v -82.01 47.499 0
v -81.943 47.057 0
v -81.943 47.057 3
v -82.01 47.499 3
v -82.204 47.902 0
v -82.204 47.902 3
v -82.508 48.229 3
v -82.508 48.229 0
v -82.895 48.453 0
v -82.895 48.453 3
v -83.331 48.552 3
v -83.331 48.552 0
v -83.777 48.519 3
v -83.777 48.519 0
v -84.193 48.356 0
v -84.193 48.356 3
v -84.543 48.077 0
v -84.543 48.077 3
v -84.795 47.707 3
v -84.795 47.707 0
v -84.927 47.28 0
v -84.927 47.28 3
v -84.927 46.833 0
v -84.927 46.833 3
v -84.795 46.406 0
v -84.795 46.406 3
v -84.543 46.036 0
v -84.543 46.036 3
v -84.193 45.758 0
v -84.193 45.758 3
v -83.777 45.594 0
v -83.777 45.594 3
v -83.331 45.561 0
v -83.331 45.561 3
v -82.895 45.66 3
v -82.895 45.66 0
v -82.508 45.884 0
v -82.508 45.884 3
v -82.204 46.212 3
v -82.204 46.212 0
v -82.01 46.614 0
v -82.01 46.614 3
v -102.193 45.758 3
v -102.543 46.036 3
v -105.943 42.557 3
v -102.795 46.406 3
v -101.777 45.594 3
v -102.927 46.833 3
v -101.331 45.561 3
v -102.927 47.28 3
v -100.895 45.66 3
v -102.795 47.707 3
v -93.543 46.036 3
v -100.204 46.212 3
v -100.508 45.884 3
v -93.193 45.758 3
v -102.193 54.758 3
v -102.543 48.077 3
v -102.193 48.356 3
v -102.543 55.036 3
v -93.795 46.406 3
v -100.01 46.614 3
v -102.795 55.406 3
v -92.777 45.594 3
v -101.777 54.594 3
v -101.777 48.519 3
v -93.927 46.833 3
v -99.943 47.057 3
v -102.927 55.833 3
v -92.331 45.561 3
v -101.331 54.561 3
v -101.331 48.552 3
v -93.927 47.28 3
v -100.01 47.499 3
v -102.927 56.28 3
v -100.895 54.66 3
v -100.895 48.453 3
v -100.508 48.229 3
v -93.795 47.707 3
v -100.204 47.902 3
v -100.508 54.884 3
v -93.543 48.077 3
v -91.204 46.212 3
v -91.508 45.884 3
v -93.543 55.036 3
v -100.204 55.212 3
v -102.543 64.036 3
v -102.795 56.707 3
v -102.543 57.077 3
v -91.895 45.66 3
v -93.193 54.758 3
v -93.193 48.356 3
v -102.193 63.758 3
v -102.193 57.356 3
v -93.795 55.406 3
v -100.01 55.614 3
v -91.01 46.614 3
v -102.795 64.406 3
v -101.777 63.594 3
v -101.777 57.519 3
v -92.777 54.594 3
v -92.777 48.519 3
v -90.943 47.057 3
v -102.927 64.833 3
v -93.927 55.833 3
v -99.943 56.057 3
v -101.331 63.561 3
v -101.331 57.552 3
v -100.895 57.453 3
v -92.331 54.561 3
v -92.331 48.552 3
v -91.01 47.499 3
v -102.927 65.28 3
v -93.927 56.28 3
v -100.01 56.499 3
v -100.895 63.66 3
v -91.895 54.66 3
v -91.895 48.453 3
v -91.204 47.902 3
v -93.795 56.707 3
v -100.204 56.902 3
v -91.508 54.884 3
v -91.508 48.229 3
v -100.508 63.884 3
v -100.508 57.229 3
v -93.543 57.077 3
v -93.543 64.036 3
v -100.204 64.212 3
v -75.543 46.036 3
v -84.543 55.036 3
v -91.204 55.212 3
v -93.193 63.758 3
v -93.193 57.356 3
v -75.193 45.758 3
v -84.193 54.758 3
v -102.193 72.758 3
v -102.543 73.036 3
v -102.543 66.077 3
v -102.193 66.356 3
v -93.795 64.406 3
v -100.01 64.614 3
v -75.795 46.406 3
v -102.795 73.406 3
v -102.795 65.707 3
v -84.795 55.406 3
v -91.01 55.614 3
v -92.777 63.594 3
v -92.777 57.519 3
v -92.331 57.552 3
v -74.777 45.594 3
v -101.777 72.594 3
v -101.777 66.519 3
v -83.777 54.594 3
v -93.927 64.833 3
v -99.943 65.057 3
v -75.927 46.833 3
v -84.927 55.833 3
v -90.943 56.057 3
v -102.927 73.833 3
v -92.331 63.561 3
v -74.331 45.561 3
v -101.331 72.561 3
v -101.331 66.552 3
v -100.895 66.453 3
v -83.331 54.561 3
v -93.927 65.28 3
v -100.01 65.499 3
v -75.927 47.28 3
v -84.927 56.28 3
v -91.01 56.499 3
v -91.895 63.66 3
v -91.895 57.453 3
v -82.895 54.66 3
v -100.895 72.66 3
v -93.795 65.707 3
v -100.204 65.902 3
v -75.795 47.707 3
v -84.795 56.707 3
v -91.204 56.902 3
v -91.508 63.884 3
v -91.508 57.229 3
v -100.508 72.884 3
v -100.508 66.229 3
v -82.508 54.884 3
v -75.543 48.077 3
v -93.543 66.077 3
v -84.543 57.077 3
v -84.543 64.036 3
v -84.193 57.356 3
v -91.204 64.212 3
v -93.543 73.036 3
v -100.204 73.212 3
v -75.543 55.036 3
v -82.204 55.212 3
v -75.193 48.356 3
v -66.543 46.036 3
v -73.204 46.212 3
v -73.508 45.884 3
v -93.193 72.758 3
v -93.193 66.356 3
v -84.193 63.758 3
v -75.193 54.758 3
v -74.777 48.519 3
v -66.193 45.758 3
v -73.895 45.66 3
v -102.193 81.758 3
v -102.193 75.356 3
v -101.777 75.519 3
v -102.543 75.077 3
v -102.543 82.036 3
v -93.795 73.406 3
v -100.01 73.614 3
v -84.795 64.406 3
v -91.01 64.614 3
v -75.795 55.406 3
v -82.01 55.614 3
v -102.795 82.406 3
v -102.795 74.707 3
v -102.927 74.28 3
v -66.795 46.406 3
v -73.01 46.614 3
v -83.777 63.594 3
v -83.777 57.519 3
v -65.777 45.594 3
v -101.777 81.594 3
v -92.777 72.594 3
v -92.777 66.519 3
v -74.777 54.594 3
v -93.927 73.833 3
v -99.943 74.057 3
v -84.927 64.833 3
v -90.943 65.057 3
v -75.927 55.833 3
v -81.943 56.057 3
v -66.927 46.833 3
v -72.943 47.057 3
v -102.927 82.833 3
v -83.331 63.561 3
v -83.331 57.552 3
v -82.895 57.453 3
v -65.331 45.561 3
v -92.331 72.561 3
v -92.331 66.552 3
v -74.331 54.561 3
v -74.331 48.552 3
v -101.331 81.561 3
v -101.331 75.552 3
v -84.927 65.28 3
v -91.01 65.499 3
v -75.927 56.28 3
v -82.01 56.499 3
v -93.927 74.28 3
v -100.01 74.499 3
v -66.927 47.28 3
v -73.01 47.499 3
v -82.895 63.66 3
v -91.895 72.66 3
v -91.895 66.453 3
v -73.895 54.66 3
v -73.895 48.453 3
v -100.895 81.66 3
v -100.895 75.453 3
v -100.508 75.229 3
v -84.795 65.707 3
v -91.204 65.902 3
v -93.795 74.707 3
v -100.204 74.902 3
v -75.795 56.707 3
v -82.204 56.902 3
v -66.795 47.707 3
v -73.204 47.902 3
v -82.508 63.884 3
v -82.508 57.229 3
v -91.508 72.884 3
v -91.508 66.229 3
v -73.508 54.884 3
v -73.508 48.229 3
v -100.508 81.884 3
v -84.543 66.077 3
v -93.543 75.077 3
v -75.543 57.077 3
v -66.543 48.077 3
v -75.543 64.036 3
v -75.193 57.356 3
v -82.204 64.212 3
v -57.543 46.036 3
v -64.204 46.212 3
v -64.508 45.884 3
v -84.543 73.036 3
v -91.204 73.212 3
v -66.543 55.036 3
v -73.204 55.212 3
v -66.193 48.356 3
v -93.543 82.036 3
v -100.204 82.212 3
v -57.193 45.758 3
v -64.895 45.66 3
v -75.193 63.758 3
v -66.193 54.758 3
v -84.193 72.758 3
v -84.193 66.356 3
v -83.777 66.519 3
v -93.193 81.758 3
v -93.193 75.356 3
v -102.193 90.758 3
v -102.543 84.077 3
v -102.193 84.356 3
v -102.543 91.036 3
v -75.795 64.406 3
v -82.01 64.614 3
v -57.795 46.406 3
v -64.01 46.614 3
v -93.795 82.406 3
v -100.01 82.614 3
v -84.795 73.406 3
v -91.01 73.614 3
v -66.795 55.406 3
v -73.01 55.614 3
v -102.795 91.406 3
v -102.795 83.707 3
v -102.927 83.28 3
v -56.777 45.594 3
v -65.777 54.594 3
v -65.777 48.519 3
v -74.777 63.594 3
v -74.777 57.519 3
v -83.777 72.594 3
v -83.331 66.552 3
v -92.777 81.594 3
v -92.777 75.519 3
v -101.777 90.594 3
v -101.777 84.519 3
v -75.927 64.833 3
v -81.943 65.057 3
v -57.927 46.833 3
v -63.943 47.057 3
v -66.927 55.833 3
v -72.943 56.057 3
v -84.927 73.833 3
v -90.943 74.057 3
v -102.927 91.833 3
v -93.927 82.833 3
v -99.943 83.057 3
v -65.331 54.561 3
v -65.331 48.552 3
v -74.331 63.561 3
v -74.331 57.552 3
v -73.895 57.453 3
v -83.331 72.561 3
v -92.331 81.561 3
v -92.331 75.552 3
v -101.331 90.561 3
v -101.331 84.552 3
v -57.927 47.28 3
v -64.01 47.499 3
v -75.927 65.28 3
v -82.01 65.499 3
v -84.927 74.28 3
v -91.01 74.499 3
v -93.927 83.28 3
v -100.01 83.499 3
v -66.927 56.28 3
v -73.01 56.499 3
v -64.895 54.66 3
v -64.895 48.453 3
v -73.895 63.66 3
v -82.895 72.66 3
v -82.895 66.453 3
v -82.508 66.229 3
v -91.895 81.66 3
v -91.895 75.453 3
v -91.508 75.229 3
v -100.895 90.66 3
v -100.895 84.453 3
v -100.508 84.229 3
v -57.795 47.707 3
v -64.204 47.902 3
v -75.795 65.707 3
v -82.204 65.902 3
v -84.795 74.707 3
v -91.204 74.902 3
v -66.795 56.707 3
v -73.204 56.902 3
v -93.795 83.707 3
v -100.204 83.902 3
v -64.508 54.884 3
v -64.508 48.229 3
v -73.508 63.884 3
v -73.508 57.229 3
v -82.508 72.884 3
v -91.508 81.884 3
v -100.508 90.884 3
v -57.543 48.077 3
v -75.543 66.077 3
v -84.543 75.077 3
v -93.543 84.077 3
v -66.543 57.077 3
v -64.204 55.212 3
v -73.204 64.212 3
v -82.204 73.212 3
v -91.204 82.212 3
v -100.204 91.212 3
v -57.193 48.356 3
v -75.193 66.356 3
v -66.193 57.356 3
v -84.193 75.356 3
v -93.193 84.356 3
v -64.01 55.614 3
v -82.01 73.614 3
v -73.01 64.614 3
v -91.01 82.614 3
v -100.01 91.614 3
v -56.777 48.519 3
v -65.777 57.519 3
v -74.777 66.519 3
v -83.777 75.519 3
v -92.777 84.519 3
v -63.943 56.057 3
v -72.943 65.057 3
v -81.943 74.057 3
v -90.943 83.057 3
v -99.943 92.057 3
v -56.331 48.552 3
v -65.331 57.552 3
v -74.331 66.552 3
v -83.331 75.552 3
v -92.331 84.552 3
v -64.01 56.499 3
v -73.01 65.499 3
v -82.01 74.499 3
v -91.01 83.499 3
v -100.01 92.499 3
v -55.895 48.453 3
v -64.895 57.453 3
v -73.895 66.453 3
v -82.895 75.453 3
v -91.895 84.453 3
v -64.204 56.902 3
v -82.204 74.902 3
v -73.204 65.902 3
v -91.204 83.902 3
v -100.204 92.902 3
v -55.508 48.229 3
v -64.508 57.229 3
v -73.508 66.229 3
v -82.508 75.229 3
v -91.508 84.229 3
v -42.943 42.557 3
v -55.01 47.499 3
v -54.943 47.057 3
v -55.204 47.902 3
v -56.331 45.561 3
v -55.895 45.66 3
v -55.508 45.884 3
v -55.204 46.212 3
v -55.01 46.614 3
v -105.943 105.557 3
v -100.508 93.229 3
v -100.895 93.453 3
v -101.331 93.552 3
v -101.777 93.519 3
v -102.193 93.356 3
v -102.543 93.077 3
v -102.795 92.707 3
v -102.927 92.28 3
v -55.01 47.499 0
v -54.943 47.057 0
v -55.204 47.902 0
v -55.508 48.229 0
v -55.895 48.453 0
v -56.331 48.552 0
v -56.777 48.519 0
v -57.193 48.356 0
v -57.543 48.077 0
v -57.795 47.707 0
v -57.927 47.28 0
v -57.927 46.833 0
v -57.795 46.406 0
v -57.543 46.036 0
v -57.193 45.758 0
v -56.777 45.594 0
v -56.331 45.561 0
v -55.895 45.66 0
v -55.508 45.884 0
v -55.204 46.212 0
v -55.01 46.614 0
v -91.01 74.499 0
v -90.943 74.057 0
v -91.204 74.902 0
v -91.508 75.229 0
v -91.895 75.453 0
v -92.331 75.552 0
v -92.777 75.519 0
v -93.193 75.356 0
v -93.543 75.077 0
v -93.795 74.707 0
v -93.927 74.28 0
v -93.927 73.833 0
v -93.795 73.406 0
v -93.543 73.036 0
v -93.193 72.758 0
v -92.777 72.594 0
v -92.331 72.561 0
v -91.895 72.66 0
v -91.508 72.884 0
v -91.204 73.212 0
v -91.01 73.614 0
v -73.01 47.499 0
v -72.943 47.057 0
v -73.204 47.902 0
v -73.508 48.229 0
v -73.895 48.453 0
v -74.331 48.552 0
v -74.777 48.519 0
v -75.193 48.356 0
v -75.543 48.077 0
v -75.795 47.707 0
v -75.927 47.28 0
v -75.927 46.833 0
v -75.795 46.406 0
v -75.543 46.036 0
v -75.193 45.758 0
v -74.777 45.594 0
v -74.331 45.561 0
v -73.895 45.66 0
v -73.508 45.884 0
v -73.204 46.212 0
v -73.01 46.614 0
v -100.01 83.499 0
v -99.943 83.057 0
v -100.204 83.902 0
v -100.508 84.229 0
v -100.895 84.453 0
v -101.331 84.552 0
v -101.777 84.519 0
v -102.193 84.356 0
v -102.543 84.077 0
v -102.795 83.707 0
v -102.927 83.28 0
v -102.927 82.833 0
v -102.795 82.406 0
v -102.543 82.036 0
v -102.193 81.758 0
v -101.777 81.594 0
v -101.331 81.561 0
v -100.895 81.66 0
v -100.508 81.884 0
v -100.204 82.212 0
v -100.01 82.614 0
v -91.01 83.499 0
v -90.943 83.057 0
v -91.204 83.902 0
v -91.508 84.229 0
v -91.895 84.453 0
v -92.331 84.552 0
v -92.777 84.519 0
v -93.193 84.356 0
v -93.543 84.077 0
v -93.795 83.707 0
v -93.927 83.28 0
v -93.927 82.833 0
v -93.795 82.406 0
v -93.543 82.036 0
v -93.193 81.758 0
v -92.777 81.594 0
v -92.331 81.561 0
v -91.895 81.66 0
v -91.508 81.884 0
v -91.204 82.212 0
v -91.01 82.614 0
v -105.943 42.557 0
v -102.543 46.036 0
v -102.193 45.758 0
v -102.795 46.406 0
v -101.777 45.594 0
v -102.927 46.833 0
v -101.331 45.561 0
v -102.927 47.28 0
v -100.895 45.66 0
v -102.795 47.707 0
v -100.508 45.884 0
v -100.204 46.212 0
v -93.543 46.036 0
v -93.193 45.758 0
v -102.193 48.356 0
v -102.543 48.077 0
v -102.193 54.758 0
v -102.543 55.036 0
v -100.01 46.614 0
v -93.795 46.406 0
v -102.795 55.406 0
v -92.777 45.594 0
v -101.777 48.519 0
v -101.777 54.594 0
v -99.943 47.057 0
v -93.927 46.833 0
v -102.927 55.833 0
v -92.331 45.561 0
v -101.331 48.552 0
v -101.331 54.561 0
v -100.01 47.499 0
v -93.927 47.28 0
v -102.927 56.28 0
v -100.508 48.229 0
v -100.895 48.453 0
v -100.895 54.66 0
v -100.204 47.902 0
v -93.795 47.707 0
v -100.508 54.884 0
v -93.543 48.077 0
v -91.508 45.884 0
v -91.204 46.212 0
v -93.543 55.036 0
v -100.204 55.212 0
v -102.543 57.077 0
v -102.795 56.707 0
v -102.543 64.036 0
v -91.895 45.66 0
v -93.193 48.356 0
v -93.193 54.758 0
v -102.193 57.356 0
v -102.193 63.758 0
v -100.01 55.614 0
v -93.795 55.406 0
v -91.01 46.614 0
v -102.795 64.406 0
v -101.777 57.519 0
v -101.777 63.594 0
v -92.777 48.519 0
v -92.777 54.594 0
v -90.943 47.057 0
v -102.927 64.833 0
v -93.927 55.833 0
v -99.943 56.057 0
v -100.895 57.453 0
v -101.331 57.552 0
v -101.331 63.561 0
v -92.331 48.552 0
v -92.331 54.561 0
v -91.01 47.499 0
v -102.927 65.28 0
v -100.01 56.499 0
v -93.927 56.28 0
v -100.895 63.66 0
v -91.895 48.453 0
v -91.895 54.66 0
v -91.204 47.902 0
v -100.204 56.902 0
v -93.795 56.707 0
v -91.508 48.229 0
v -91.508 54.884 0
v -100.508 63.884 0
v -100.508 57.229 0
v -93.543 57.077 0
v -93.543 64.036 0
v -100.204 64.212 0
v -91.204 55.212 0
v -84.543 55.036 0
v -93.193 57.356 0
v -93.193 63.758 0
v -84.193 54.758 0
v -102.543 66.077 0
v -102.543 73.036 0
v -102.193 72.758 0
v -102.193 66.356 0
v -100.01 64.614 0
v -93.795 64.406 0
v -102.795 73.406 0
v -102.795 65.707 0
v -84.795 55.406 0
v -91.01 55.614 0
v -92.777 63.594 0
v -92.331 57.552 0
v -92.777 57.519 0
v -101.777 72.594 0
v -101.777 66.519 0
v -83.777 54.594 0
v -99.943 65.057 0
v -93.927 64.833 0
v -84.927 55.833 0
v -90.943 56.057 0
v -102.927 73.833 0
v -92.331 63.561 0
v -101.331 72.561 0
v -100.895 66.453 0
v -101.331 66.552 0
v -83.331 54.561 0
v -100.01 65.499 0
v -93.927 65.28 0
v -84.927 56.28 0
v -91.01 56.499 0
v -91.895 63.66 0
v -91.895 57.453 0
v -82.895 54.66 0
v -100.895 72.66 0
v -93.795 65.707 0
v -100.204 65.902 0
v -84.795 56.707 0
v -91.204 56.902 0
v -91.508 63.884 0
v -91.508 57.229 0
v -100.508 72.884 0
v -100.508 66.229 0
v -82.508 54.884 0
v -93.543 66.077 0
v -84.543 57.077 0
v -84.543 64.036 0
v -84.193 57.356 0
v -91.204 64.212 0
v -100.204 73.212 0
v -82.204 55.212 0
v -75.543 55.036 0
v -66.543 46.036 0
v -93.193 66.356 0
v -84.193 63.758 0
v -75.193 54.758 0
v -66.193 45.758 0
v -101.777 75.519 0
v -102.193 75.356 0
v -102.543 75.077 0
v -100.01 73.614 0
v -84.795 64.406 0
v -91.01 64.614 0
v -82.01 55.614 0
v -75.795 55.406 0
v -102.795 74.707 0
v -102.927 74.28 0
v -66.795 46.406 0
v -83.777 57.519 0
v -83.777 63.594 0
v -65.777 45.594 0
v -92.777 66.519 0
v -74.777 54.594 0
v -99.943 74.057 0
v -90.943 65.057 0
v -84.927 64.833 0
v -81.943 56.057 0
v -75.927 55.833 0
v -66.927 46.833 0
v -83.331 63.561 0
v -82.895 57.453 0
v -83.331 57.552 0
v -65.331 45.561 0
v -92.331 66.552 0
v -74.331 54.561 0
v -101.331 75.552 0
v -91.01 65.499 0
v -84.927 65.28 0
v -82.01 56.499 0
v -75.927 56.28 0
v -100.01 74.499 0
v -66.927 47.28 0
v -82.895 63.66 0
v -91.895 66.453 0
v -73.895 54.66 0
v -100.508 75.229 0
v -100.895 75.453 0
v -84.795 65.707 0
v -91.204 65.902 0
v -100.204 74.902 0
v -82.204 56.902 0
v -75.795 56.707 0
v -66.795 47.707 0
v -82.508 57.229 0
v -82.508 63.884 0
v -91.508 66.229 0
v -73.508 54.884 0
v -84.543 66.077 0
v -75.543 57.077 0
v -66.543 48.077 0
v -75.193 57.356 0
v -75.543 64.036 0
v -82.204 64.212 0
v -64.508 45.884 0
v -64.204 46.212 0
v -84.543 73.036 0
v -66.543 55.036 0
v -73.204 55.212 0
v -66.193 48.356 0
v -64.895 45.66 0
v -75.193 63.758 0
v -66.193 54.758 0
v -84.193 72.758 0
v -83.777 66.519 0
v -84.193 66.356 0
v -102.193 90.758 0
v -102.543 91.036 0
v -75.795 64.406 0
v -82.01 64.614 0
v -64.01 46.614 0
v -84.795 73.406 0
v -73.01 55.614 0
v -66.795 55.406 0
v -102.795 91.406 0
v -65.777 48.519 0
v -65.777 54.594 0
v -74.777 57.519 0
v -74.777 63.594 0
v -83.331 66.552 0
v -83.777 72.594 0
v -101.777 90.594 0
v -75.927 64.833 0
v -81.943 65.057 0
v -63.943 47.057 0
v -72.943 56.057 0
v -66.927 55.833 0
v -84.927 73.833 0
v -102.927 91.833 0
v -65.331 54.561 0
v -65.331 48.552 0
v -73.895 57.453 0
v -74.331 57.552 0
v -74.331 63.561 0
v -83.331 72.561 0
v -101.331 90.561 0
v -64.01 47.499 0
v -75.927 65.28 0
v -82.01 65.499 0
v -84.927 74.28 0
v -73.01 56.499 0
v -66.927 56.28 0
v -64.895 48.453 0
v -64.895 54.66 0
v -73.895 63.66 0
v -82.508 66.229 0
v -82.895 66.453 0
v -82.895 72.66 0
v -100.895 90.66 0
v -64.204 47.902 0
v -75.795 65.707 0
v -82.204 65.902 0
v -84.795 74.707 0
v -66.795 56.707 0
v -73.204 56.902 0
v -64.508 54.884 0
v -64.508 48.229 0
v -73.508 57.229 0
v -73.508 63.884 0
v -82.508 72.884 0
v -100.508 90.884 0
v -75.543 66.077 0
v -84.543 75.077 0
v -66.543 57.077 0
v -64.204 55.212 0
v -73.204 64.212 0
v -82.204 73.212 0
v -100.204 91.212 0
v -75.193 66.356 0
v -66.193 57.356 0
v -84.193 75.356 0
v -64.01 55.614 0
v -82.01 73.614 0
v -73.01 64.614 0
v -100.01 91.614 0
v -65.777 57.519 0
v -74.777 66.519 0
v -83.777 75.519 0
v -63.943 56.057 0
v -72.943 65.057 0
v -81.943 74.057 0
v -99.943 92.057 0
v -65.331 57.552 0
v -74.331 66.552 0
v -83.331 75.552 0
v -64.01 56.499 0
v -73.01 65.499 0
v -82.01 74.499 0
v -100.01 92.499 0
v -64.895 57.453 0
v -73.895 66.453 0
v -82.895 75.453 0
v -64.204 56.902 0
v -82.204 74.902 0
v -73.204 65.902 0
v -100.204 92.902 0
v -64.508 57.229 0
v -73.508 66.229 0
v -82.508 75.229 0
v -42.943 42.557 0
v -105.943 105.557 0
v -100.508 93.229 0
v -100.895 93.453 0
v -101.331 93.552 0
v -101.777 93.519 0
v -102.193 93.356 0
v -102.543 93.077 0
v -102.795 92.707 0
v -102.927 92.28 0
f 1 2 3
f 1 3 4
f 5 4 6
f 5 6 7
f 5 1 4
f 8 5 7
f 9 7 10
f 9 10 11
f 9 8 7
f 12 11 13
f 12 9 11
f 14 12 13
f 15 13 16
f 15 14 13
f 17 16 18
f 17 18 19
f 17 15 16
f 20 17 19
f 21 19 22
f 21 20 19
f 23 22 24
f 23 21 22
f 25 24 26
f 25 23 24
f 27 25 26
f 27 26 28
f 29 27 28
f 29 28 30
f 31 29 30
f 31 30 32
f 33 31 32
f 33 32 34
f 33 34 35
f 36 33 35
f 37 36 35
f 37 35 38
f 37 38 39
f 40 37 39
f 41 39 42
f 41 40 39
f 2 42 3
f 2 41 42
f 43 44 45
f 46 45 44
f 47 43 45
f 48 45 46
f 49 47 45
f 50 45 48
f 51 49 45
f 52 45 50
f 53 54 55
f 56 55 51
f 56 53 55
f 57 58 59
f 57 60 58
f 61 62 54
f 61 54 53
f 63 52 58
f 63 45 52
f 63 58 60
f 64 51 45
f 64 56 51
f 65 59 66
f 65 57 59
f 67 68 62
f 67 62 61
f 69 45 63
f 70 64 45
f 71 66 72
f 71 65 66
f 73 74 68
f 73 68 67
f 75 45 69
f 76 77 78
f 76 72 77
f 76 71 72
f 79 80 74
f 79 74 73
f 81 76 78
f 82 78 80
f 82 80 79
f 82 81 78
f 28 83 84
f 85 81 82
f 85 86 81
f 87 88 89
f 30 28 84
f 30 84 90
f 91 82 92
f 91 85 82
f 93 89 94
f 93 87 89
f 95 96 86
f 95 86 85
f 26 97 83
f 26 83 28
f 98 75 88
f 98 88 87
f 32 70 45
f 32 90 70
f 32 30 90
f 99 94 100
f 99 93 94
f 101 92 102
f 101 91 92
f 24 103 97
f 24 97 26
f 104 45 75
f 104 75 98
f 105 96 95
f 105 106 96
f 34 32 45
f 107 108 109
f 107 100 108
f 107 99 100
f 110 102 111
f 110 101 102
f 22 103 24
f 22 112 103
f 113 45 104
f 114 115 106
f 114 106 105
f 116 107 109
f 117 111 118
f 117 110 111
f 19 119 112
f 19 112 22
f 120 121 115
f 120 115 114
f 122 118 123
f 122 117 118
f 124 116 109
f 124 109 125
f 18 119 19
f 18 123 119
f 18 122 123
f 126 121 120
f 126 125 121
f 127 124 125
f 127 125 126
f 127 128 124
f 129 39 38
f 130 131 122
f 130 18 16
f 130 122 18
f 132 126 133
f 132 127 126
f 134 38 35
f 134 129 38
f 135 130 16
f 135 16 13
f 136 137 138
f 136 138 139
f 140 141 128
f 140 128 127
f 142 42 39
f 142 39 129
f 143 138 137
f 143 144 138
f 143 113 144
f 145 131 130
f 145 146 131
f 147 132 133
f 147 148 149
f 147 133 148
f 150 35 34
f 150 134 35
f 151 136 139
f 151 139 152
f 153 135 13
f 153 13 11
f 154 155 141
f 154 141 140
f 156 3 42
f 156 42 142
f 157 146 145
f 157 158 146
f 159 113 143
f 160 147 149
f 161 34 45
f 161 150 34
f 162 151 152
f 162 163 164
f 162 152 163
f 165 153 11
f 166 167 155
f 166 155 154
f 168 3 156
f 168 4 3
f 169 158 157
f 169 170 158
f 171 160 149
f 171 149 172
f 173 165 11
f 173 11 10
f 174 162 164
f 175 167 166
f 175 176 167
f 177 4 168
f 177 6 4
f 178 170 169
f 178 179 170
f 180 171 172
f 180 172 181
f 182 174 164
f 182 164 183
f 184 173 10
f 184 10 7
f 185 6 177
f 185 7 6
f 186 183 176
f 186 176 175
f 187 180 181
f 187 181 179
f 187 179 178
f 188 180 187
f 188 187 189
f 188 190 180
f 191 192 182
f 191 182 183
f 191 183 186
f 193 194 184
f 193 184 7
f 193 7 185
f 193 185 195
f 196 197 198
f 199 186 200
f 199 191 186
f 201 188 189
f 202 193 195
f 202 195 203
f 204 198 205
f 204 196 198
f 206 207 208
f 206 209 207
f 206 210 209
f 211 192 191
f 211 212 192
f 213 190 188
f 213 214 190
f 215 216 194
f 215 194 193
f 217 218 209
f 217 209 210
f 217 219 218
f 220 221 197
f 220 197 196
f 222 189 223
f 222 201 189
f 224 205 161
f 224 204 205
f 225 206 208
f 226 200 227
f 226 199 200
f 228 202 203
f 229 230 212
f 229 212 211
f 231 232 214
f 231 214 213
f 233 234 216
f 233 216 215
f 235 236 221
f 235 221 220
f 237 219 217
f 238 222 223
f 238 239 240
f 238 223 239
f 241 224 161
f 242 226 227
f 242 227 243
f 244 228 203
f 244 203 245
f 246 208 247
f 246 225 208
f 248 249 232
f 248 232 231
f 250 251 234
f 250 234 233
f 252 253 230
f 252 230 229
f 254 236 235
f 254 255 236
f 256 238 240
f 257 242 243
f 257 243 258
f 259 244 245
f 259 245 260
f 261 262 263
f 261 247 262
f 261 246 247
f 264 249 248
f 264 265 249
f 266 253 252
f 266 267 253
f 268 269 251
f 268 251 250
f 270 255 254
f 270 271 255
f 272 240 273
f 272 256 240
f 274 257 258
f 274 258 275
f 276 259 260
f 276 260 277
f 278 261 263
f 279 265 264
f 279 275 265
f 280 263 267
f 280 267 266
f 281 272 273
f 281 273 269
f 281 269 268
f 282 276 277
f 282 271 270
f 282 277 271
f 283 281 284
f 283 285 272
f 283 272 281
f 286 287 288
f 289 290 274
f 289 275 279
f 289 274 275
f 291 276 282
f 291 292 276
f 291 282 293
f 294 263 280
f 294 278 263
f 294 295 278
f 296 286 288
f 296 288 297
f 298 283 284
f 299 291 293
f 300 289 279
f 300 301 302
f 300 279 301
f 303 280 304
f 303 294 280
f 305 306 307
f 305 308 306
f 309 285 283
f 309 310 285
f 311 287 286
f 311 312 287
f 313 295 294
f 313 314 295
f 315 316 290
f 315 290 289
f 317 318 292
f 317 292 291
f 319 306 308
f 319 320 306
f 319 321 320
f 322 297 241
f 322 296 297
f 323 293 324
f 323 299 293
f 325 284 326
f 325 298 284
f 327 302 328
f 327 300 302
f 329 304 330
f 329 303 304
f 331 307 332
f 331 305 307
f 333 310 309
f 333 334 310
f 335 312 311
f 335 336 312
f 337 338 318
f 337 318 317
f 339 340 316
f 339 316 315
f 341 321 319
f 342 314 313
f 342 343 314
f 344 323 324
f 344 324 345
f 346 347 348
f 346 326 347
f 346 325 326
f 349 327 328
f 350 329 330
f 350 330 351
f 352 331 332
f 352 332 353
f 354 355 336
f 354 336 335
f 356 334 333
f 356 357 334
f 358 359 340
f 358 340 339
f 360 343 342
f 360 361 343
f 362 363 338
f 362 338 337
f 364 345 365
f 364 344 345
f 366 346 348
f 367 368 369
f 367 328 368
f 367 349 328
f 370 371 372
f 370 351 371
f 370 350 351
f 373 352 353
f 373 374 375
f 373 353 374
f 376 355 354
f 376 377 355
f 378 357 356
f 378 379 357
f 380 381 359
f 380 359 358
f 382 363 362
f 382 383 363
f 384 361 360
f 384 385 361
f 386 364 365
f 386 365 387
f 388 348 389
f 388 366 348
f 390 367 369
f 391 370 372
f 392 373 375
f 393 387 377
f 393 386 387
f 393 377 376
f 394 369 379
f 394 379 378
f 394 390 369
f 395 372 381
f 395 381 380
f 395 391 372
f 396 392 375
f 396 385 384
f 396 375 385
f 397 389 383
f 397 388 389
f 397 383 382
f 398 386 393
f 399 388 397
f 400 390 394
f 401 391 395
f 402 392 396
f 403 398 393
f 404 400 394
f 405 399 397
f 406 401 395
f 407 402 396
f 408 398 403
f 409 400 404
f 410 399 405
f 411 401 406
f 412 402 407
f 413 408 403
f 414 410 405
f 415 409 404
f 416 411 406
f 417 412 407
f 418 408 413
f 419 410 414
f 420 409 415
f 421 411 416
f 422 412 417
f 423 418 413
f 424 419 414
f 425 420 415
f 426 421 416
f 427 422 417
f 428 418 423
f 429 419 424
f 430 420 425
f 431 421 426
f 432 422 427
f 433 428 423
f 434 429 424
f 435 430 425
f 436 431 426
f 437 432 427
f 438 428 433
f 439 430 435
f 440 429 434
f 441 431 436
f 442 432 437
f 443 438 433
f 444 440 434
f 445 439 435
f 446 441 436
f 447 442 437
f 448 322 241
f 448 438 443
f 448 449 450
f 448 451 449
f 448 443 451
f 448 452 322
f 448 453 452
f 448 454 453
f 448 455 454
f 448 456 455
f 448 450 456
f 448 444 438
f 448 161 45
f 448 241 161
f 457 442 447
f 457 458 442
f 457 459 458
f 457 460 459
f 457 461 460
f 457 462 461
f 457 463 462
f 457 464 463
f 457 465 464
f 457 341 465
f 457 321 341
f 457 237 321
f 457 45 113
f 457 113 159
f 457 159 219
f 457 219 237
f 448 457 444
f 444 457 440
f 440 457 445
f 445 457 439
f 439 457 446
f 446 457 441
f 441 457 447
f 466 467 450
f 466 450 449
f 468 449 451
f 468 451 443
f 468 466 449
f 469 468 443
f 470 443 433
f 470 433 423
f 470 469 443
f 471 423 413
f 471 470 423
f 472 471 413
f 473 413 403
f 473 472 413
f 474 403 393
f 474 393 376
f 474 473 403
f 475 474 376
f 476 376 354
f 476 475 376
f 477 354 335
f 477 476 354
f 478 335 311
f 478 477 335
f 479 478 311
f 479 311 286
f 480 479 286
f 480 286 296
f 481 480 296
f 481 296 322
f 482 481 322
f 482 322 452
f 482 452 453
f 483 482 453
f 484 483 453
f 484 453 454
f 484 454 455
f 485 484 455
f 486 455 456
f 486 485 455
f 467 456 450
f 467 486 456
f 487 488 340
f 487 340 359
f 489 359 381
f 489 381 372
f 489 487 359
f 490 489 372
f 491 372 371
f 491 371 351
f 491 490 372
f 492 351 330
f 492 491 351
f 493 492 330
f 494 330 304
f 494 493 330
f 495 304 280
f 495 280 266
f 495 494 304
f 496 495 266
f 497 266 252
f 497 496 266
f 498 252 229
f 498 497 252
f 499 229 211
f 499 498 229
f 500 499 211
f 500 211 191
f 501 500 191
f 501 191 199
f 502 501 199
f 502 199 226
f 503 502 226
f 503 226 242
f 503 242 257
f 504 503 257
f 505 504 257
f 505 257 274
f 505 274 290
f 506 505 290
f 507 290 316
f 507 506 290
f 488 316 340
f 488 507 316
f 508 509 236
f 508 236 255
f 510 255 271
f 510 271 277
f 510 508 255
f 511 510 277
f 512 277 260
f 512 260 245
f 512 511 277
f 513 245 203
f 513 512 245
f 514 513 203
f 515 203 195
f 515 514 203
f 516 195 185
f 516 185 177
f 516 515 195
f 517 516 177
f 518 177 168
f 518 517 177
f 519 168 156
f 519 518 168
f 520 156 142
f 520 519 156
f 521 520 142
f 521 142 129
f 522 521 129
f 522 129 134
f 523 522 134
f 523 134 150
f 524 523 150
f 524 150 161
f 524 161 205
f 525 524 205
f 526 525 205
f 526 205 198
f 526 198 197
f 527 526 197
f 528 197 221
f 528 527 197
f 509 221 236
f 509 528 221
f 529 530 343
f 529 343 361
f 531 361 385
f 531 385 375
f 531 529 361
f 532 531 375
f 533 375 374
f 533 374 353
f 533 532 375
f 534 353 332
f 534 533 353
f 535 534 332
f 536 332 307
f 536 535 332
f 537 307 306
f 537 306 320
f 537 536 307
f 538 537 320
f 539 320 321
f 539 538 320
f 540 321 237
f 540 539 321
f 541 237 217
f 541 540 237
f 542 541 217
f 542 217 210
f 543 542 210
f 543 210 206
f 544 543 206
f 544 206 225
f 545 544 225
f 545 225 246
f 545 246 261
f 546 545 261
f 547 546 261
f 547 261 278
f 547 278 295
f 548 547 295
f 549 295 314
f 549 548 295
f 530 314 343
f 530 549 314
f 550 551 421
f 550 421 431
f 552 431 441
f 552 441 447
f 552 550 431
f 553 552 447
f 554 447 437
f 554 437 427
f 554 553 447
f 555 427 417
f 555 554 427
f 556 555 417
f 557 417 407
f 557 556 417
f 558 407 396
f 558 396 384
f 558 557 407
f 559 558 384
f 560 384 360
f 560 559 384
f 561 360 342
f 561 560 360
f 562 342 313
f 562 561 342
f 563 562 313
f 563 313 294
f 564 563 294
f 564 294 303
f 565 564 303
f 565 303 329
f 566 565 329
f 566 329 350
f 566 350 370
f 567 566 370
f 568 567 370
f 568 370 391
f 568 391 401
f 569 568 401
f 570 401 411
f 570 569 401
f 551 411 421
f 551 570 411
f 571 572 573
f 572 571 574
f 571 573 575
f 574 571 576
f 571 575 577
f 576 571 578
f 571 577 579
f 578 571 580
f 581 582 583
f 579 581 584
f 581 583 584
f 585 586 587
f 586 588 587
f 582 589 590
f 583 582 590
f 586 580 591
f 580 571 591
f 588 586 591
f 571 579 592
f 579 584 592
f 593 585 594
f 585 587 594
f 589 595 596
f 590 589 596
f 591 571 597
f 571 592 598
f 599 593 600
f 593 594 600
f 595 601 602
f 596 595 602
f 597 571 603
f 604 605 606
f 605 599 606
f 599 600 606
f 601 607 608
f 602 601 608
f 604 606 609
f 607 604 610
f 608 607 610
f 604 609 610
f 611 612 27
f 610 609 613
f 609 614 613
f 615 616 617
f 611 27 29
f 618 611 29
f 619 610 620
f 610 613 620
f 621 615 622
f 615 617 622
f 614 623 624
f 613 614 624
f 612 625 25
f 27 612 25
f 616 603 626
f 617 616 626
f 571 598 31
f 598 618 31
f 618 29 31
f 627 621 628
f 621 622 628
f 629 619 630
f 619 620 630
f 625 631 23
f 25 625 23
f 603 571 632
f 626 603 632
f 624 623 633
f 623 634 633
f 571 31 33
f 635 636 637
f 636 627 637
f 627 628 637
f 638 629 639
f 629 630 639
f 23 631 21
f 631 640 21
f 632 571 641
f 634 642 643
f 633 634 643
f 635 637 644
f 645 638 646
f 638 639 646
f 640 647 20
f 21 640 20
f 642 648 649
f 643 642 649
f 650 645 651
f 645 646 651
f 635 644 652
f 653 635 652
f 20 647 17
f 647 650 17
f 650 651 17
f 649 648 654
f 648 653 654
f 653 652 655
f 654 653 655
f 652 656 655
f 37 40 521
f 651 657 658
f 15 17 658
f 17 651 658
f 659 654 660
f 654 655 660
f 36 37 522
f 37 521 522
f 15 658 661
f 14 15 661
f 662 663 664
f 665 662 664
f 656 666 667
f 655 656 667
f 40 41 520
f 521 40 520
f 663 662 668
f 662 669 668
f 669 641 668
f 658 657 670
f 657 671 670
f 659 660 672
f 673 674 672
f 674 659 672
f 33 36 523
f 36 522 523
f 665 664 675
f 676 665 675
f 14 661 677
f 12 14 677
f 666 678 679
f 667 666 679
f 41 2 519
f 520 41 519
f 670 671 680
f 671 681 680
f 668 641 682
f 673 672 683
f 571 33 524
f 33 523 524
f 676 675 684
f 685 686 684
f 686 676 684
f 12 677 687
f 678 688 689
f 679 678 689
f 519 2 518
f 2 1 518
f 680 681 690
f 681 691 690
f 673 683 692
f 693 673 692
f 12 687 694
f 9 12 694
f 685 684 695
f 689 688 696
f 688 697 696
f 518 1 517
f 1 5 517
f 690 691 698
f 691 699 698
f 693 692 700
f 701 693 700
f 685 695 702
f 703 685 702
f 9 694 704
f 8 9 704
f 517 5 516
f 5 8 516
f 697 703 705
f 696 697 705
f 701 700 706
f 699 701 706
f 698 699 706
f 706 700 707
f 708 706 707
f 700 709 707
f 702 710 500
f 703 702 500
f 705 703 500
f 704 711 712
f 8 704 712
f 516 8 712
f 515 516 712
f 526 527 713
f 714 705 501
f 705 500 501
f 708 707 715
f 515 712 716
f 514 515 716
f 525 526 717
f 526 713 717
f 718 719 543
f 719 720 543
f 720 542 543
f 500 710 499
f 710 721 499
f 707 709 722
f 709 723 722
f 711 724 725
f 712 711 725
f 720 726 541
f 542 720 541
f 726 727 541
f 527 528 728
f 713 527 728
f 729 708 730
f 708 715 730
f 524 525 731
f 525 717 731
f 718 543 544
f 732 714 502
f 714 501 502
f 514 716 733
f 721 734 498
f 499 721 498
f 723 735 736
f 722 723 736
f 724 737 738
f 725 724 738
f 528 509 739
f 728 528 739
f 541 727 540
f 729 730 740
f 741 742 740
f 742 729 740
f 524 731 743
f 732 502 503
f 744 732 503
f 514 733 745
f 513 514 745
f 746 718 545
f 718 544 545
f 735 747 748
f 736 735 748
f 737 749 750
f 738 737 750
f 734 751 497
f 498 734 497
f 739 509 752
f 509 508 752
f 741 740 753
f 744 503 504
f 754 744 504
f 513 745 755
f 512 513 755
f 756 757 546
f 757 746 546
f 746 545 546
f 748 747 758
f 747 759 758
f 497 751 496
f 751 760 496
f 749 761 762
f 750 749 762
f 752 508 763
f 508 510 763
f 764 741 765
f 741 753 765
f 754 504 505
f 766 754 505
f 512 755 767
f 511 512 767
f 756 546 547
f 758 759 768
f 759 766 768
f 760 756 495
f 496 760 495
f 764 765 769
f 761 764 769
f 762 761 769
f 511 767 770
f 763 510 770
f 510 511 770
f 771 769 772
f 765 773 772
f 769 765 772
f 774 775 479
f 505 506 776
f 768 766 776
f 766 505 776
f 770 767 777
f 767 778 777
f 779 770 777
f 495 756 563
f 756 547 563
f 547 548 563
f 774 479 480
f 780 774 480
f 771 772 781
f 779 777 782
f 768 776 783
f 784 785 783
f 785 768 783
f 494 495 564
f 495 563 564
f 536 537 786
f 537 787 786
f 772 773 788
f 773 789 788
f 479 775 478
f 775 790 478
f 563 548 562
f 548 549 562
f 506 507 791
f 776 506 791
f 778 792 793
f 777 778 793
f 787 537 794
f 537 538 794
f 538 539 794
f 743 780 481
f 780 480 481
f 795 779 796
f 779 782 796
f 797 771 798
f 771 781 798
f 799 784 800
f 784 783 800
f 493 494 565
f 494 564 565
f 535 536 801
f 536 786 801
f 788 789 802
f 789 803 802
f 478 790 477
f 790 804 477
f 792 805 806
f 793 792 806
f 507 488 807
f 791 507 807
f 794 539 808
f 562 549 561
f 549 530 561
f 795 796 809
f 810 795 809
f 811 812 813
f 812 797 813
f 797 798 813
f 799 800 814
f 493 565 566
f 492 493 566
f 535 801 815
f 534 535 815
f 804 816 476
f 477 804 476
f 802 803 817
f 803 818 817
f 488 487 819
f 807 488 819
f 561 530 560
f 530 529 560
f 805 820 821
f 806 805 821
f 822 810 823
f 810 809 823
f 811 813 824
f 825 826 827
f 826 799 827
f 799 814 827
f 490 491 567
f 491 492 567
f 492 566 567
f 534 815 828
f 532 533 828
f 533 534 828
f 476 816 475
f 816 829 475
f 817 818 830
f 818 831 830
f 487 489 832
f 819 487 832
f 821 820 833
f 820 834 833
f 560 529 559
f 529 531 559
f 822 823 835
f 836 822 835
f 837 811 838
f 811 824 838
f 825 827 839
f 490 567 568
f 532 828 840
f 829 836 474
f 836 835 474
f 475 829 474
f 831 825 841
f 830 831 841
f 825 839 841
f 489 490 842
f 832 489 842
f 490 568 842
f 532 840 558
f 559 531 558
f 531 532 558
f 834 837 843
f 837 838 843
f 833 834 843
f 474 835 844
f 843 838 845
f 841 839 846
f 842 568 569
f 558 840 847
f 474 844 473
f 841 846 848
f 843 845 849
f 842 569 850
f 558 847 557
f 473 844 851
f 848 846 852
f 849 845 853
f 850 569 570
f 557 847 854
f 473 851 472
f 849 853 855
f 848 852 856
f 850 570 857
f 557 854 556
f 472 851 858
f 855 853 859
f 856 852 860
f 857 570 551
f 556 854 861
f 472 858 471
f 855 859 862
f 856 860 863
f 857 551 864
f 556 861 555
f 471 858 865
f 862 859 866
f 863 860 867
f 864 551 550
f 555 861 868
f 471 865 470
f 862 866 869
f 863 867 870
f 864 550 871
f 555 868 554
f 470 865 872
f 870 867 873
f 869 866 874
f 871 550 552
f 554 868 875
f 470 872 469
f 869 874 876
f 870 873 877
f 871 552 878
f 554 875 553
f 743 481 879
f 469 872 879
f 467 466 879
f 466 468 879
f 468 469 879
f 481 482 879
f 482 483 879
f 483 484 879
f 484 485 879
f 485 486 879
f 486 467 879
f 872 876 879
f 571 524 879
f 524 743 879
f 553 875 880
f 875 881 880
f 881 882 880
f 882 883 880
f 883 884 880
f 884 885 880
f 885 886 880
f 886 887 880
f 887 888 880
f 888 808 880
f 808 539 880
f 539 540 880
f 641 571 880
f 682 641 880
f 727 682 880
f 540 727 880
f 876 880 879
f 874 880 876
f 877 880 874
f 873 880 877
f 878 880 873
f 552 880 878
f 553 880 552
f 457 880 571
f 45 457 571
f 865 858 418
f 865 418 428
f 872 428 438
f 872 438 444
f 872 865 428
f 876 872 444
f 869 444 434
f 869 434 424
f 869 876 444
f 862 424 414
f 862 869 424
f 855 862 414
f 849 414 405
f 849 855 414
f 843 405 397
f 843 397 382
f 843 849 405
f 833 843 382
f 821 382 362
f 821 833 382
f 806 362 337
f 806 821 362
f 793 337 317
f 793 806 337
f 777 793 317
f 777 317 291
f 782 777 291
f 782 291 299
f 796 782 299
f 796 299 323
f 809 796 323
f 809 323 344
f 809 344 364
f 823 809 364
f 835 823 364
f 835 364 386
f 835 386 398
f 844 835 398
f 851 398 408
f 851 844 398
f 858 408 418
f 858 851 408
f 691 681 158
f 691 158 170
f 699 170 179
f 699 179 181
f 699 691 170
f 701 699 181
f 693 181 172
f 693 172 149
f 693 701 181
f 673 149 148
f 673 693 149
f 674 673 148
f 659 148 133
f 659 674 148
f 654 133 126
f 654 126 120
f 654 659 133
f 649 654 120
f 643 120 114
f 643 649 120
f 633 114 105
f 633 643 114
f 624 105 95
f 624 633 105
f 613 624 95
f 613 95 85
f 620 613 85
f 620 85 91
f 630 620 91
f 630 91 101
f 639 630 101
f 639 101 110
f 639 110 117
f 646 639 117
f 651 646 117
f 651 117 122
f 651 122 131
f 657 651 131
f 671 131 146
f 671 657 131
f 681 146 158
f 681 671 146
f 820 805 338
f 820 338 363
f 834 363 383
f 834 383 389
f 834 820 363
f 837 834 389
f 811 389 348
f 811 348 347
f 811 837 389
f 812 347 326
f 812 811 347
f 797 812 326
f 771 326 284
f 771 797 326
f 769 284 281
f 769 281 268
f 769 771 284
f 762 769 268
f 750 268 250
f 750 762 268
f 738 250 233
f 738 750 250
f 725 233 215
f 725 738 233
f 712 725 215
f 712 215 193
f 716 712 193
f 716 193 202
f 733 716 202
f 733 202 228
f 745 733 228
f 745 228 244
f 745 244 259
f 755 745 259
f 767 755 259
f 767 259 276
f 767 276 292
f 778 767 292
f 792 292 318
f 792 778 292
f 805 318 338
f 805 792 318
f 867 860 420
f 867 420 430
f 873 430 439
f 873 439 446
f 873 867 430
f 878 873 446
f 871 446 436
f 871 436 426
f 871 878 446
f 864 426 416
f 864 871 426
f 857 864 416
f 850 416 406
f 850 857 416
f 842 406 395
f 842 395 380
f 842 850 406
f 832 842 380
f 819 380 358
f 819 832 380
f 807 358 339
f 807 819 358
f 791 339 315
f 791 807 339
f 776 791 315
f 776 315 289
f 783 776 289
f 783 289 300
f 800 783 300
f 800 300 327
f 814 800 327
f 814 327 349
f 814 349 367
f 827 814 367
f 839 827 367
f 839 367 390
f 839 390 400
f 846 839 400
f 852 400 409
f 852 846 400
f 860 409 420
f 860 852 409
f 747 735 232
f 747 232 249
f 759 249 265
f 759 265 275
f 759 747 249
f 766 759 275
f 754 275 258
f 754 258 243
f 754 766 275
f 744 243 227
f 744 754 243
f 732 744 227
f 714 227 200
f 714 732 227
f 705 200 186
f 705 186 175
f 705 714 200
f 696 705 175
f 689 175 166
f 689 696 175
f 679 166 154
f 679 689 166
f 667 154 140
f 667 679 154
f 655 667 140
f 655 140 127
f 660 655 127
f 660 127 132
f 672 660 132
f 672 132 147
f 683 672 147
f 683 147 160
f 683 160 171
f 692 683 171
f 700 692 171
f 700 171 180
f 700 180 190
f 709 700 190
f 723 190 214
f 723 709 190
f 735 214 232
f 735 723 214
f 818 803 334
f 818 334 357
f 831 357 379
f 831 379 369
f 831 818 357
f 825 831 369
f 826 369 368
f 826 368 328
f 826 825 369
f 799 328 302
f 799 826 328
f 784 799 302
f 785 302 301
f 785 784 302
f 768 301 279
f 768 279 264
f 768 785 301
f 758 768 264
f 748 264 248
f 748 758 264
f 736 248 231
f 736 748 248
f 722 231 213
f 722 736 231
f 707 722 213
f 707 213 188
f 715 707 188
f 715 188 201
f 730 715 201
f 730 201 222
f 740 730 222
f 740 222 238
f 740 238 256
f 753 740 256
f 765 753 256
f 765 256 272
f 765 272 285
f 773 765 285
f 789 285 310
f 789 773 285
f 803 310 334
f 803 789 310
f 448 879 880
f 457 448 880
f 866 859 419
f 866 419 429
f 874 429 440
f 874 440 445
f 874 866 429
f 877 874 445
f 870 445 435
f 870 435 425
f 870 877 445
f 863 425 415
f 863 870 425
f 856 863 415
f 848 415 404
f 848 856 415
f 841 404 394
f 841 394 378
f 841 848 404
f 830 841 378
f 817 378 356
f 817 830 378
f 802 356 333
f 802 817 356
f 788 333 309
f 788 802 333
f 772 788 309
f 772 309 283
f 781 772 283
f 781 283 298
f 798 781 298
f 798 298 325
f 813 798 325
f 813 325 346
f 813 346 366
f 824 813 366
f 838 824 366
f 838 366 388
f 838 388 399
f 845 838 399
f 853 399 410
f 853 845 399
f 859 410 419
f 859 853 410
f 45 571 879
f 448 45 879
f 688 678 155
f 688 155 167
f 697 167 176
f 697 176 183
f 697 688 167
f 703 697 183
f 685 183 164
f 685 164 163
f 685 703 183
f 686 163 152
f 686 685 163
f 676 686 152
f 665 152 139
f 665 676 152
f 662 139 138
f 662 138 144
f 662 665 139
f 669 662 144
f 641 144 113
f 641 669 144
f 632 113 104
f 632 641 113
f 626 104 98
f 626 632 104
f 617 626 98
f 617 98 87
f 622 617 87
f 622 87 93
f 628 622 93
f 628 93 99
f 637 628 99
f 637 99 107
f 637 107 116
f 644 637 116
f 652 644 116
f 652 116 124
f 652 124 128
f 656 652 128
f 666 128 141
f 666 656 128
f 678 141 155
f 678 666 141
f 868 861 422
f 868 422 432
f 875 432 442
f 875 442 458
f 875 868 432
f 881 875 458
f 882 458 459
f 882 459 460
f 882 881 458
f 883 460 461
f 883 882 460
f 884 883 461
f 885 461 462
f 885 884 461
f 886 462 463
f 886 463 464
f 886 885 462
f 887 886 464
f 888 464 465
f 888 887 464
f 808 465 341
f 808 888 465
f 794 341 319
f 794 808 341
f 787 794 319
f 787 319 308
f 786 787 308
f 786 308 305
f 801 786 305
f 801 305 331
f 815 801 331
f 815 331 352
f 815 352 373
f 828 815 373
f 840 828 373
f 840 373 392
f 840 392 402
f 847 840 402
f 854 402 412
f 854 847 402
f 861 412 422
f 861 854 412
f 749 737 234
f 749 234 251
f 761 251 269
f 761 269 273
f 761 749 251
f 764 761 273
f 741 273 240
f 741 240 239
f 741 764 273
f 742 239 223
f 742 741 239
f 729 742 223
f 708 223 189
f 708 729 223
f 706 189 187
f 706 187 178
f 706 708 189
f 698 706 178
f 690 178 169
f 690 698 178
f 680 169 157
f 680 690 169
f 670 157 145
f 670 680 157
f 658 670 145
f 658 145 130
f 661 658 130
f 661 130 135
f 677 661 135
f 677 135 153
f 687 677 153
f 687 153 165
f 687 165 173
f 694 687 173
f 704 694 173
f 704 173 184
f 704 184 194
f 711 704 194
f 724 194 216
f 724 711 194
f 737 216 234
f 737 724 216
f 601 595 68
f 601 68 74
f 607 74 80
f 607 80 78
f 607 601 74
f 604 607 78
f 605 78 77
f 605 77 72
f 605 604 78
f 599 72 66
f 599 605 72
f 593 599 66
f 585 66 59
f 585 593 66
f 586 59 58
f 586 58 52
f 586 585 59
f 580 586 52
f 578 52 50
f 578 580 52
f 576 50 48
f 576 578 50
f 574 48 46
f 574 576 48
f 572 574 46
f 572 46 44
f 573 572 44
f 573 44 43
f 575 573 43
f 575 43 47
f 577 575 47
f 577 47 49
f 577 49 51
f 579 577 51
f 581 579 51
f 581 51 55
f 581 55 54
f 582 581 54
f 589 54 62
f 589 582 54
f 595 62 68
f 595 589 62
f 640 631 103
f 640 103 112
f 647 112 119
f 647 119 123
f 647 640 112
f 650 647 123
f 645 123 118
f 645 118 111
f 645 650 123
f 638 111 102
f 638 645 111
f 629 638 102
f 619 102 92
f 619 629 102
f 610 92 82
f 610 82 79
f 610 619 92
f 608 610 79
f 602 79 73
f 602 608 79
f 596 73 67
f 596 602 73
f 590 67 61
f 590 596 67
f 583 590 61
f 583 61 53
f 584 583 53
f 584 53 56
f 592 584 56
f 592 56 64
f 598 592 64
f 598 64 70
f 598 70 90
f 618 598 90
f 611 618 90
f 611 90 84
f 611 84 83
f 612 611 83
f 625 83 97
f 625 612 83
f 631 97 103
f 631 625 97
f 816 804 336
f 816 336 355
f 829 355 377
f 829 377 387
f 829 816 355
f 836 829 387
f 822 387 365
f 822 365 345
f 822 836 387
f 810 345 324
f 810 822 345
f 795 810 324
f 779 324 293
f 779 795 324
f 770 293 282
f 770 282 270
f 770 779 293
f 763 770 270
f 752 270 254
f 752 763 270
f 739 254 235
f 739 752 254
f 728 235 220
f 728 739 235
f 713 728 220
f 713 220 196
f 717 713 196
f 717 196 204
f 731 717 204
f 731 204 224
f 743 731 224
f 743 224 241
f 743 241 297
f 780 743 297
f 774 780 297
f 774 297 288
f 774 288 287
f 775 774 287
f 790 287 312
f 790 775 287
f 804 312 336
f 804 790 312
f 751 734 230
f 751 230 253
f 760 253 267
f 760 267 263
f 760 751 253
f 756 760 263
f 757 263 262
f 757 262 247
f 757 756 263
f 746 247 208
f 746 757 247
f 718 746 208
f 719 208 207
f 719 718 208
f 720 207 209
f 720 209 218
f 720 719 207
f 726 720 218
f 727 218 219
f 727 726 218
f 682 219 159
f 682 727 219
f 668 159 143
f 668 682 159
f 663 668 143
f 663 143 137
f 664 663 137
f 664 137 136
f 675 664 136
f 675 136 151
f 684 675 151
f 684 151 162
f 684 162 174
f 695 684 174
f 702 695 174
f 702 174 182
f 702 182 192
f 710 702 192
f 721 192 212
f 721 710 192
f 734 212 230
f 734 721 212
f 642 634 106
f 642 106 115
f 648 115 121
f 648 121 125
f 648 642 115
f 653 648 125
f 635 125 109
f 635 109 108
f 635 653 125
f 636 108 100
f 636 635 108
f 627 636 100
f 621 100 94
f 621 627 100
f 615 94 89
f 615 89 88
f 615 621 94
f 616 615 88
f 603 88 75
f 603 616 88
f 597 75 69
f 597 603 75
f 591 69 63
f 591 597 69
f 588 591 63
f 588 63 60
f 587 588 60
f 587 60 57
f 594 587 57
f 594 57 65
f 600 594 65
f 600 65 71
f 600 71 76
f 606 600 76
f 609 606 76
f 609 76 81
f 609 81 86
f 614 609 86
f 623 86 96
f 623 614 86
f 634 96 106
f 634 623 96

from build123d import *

# Parameters (mm, degrees)
MODEL_R                 = 1.5
SALIENTE_EXTRUIR1_DEPTH = 3


with BuildPart() as part:
    # Model → Saliente-Extruir1 (new body)
    with BuildSketch(Plane.XY):
        Polygon((-105.943383637, 105.556539338), (-105.943383637, 42.556539338), (-42.943383637, 42.556539338), align=None)
        with Locations((-101.443383637, 92.056539338)):
            Circle(MODEL_R, mode=Mode.SUBTRACT)
        with Locations((-101.443383637, 83.056539338)):
            Circle(MODEL_R, mode=Mode.SUBTRACT)
        with Locations((-92.443383637, 83.056539338)):
            Circle(MODEL_R, mode=Mode.SUBTRACT)
        with Locations((-101.443383637, 74.056539338)):
            Circle(MODEL_R, mode=Mode.SUBTRACT)
        with Locations((-92.443383637, 74.056539338)):
            Circle(MODEL_R, mode=Mode.SUBTRACT)
        with Locations((-83.443383637, 74.056539338)):
            Circle(MODEL_R, mode=Mode.SUBTRACT)
        with Locations((-101.443383637, 65.056539338)):
            Circle(MODEL_R, mode=Mode.SUBTRACT)
        with Locations((-92.443383637, 65.056539338)):
            Circle(MODEL_R, mode=Mode.SUBTRACT)
        with Locations((-83.443383637, 65.056539338)):
            Circle(MODEL_R, mode=Mode.SUBTRACT)
        with Locations((-74.443383637, 65.056539338)):
            Circle(MODEL_R, mode=Mode.SUBTRACT)
        with Locations((-101.443383637, 56.056539338)):
            Circle(MODEL_R, mode=Mode.SUBTRACT)
        with Locations((-92.443383637, 56.056539338)):
            Circle(MODEL_R, mode=Mode.SUBTRACT)
        with Locations((-83.443383637, 56.056539338)):
            Circle(MODEL_R, mode=Mode.SUBTRACT)
        with Locations((-74.443383637, 56.056539338)):
            Circle(MODEL_R, mode=Mode.SUBTRACT)
        with Locations((-65.443383637, 56.056539338)):
            Circle(MODEL_R, mode=Mode.SUBTRACT)
        with Locations((-101.443383637, 47.056539338)):
            Circle(MODEL_R, mode=Mode.SUBTRACT)
        with Locations((-92.443383637, 47.056539338)):
            Circle(MODEL_R, mode=Mode.SUBTRACT)
        with Locations((-83.443383637, 47.056539338)):
            Circle(MODEL_R, mode=Mode.SUBTRACT)
        with Locations((-74.443383637, 47.056539338)):
            Circle(MODEL_R, mode=Mode.SUBTRACT)
        with Locations((-65.443383637, 47.056539338)):
            Circle(MODEL_R, mode=Mode.SUBTRACT)
        with Locations((-56.443383637, 47.056539338)):
            Circle(MODEL_R, mode=Mode.SUBTRACT)
    extrude(amount=SALIENTE_EXTRUIR1_DEPTH)


solid = part.part
